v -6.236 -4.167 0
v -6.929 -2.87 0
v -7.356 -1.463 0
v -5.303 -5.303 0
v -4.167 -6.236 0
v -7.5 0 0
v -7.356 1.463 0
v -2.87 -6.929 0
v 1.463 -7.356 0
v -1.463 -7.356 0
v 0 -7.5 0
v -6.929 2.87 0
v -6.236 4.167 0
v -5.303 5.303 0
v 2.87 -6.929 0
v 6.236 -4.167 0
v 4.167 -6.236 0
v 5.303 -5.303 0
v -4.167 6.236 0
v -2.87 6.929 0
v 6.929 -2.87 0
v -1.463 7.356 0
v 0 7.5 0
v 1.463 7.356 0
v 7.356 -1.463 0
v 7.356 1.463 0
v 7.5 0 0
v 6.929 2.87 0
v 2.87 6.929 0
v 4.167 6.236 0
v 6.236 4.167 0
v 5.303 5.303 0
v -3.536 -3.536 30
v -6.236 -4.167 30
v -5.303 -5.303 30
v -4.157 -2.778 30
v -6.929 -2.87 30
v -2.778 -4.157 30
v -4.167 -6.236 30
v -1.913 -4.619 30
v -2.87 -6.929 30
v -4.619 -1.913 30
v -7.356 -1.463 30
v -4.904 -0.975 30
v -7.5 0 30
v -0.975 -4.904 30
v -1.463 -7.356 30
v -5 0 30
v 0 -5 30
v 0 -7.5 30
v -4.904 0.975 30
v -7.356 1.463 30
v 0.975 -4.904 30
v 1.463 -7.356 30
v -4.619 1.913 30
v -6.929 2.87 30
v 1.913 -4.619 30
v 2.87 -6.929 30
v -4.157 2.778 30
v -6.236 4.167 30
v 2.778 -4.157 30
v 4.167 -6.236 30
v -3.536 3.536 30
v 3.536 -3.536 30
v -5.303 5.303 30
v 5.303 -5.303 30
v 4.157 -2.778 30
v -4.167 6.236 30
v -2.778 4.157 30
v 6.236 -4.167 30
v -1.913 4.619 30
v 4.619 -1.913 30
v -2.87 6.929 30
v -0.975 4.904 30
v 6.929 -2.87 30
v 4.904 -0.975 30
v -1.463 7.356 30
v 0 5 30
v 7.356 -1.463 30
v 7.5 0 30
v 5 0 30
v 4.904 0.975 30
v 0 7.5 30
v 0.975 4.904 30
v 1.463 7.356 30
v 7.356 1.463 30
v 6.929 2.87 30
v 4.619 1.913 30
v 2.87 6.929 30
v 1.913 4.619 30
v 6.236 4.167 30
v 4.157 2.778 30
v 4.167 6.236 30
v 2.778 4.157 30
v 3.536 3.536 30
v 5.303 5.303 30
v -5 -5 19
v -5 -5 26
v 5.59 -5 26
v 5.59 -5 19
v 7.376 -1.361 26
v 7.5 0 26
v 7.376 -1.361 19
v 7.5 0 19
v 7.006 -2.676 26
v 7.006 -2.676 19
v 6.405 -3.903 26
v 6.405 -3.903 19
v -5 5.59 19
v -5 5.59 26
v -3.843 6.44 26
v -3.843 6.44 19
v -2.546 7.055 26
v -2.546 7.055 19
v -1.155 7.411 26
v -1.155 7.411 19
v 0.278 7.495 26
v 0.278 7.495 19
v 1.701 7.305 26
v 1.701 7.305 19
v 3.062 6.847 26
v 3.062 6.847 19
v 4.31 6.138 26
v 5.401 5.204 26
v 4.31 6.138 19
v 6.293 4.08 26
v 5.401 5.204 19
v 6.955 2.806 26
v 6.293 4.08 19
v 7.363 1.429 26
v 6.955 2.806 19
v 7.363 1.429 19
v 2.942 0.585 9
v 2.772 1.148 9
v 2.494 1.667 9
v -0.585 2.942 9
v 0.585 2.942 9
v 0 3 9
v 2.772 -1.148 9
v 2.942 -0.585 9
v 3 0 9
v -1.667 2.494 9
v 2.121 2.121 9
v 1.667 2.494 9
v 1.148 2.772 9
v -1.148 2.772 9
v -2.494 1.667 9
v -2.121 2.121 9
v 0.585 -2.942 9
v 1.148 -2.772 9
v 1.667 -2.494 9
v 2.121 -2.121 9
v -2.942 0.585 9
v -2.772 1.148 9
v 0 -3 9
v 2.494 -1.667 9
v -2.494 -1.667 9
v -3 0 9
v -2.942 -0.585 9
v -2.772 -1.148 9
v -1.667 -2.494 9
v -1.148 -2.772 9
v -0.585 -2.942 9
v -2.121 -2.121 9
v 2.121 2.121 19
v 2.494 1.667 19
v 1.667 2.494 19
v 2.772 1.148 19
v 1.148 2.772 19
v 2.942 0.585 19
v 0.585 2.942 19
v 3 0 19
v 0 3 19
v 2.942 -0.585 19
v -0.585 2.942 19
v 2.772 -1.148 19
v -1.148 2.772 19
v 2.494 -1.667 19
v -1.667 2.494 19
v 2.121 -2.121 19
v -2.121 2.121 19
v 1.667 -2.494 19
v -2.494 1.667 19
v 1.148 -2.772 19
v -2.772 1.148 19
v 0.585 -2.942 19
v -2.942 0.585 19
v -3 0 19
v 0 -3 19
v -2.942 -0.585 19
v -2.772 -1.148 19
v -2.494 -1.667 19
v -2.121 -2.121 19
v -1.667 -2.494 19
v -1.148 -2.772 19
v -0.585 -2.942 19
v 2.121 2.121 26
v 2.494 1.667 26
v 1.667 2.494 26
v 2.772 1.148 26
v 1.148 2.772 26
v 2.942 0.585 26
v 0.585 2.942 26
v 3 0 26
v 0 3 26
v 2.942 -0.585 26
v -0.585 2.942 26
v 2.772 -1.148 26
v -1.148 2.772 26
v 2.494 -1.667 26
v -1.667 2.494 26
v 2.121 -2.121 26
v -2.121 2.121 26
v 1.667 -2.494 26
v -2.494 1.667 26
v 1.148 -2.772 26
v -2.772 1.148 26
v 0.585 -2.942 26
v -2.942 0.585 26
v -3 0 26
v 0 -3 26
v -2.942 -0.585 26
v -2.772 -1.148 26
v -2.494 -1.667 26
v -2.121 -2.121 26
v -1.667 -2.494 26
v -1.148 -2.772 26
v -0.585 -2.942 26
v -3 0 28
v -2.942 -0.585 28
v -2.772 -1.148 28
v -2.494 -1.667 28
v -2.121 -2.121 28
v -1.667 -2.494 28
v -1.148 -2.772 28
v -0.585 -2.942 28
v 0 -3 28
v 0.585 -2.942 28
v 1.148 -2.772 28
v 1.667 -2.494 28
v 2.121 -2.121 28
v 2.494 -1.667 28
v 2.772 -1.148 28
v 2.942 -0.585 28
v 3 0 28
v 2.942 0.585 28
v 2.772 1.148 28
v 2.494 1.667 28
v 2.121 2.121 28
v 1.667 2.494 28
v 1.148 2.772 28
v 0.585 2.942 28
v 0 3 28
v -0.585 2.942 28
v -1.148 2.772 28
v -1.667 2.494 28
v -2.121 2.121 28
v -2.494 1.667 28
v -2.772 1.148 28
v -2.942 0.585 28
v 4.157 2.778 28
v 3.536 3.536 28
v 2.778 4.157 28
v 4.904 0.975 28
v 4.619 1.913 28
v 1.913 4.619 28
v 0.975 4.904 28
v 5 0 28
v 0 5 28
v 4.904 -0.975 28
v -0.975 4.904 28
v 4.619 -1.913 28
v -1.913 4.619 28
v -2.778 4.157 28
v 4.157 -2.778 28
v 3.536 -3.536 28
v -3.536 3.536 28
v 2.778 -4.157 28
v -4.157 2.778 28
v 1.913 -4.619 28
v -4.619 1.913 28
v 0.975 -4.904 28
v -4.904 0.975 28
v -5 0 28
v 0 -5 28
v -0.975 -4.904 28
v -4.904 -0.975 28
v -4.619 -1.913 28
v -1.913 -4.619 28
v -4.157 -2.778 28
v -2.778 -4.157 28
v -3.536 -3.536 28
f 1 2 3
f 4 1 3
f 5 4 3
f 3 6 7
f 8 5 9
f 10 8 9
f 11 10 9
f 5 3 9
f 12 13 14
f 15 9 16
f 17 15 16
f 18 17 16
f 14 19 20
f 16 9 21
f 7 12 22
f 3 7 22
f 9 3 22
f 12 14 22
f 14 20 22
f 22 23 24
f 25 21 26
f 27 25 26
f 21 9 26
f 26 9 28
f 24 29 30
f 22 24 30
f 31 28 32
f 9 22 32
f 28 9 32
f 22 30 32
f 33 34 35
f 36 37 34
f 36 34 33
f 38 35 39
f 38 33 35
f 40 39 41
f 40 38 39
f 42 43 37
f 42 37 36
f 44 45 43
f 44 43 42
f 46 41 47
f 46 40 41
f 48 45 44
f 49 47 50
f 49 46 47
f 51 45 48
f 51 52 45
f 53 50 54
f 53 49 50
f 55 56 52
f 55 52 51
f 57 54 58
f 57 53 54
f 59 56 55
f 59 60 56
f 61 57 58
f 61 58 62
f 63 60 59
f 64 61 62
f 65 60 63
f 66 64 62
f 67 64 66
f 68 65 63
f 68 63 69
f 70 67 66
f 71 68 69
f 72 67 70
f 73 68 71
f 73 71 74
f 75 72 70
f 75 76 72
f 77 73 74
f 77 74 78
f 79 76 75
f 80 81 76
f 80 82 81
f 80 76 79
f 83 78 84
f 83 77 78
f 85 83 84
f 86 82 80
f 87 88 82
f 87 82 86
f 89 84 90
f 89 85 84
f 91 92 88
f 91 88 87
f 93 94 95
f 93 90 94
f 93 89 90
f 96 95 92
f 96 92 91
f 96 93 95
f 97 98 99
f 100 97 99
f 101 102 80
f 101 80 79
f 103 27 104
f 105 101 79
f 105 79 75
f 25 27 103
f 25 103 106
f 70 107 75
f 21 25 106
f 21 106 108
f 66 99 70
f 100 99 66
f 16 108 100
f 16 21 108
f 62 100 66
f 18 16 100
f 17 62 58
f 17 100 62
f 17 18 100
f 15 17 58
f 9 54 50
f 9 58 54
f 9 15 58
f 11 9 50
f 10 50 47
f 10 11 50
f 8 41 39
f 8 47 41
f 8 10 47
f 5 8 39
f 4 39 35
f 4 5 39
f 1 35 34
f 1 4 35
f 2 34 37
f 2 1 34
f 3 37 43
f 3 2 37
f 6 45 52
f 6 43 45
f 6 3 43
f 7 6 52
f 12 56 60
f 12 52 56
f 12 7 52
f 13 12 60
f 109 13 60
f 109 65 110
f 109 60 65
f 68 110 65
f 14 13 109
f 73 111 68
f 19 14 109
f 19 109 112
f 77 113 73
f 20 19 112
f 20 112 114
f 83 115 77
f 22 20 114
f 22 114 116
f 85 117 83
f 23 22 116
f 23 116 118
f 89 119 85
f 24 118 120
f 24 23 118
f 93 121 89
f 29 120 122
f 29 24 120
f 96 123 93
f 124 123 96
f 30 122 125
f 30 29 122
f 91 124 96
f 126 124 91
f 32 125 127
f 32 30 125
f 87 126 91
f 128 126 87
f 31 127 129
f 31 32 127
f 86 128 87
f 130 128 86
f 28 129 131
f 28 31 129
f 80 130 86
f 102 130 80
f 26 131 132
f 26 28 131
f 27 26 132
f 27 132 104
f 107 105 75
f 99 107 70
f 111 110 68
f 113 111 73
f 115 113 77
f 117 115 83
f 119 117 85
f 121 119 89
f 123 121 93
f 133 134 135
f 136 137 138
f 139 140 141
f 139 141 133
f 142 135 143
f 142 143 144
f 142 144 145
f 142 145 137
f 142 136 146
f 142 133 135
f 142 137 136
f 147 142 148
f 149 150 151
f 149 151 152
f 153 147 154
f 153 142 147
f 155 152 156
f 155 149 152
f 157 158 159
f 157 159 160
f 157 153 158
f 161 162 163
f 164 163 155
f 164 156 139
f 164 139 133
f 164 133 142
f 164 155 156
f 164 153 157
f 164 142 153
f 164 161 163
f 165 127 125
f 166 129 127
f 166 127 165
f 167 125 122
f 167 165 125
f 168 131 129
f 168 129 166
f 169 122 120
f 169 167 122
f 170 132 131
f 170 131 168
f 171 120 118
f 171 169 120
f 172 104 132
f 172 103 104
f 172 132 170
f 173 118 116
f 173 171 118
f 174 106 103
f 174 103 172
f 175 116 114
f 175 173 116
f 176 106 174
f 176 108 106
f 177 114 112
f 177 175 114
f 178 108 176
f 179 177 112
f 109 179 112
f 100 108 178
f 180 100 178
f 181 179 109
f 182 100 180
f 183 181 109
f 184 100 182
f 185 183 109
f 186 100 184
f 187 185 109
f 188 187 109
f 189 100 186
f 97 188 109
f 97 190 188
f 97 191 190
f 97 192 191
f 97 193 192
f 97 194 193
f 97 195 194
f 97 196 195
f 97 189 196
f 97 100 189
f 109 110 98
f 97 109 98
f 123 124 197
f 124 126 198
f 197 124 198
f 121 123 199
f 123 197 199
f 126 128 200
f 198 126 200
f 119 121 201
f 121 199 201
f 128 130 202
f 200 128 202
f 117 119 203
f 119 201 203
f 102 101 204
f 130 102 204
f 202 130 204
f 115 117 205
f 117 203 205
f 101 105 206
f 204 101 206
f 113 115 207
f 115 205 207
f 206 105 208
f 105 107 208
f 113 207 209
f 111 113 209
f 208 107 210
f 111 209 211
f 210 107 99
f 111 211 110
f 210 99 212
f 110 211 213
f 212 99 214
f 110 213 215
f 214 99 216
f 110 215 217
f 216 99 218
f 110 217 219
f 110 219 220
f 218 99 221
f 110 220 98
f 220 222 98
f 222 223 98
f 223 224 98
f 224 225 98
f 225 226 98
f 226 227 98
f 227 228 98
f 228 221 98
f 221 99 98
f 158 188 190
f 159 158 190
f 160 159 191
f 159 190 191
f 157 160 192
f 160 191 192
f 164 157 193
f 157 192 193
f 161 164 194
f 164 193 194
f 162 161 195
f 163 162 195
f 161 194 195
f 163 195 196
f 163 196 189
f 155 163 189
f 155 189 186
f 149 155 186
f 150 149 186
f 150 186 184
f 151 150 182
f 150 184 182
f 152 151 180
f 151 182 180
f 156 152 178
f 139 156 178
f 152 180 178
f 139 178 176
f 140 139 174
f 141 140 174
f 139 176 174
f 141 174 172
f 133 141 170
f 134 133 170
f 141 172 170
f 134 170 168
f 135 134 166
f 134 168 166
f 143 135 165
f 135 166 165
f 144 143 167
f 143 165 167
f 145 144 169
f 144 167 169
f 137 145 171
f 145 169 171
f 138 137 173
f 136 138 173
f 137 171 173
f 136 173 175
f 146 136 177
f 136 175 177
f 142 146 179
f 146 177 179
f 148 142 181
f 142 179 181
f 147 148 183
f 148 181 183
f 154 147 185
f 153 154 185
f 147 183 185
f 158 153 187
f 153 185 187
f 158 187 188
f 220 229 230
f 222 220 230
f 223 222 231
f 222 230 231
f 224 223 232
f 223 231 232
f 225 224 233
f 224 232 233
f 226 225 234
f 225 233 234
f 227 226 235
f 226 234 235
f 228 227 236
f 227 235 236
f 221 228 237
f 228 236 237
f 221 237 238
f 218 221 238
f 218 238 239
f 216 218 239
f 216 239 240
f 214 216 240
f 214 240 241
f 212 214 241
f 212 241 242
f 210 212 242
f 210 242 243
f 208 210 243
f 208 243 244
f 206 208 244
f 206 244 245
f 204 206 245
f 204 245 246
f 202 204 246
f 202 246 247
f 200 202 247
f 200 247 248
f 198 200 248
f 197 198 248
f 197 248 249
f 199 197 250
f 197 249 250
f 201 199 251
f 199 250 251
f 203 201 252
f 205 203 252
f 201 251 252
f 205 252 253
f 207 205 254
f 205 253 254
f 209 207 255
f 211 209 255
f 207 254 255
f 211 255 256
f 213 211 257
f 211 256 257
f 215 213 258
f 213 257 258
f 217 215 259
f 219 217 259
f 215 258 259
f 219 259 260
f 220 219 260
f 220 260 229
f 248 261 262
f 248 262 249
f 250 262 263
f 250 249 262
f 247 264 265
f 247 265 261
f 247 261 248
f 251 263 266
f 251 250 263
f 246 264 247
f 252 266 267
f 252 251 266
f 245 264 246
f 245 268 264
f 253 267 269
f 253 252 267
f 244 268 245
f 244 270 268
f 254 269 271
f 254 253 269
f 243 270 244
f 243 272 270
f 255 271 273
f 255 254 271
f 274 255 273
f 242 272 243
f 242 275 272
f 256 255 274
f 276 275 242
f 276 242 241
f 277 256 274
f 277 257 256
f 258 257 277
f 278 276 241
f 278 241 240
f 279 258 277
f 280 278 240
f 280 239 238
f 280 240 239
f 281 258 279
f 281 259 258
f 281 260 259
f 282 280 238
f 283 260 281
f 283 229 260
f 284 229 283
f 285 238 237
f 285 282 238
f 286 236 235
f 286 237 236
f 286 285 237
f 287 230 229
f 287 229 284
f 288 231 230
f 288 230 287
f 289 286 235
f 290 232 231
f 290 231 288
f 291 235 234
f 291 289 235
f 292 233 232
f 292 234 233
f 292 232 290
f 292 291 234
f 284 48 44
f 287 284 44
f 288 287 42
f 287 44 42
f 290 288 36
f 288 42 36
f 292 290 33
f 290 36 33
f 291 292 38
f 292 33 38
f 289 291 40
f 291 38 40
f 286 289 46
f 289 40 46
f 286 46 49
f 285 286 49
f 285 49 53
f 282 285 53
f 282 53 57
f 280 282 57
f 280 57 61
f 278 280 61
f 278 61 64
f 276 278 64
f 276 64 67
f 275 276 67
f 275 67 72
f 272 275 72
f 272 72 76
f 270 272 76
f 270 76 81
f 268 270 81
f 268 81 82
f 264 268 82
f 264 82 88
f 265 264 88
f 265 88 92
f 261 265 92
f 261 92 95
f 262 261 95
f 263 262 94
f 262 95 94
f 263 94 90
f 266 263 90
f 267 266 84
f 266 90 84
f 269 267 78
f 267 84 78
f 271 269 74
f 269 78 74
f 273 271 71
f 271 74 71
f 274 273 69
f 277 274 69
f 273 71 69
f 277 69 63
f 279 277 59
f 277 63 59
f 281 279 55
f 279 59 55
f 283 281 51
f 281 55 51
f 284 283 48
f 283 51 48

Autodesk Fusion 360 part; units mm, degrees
sketch "Sketch1" plane through (0, 0, 0) normal (0, 0, 1) x (1, 0, 0)
  circle A0 centre (0, 0) radius 7.5
  dimension "d1" = 15
extrude "Extrude1" add sketch "Sketch1" along normal blind 30
sketch "Sketch2" plane through (0, 0, 30) normal (0, 0, 1) x (-1, 0, 0)
  circle A0 centre (0, 0) radius 7.5
  line L0 (0, 0) -> (-10.0601, 0)
  line L1 (-10.0601, 0) -> (-10.0601, -9.4901)
  line L2 (-10.0601, -9.4901) -> (0, -9.4901)
  line L3 (0, -9.4901) -> (0, 0)
sketch "Sketch3" plane through (0, 0, 30) normal (0, 0, 1) x (-1, 0, 0)
  circle A0 centre (0, 0) radius 7.5
  circle A1 centre (0, 0) radius 5
  dimension "d8" = 10
extrude "Extrude4" cut sketch "Sketch3" against normal blind 2 contours A1
sketch "Sketch4" plane through (0, 0, 28) normal (0, 0, 1) x (-1, 0, 0)
  circle A0 centre (0, 0) radius 5
  circle A1 centre (0, 0) radius 3
  dimension "d11" = 6
extrude "Extrude5" cut sketch "Sketch4" against normal blind 2 contours A1
sketch "Sketch5" plane through (0, 0, 26) normal (0, 0, 1) x (-1, 0, 0)
  circle A0 centre (0, 0) radius 3
  line L0 (-8, -8) -> (5, -8)
  line L1 (5, -8) -> (5, 5)
  line L2 (5, 5) -> (-8, 5)
  line L3 (-8, 5) -> (-8, -8)
  line L4 (-8, -8) -> (5, 5) construction
  line L5 (5, -8) -> (-8, 5) construction
  point P0 (-1.5, -1.5)
extrude "Extrude6" cut sketch "Sketch5" against normal blind 7 contours A0 | L0 L1 L2 L3
sketch "Sketch6" plane through (0, 0, 19) normal (0, 0, 1) x (-1, 0, 0)
  arc A0 (-5.5902, 5) -> (5, -5.5902) centre (0, 0) ccw
  line L0 (5, -5.5902) -> (5, 5)
  line L1 (5, 5) -> (-5.5902, 5)
  circle A1 centre (0, 0) radius 3
  dimension "d16" = 6
extrude "Extrude7" cut sketch "Sketch6" against normal blind 10 contours A1
